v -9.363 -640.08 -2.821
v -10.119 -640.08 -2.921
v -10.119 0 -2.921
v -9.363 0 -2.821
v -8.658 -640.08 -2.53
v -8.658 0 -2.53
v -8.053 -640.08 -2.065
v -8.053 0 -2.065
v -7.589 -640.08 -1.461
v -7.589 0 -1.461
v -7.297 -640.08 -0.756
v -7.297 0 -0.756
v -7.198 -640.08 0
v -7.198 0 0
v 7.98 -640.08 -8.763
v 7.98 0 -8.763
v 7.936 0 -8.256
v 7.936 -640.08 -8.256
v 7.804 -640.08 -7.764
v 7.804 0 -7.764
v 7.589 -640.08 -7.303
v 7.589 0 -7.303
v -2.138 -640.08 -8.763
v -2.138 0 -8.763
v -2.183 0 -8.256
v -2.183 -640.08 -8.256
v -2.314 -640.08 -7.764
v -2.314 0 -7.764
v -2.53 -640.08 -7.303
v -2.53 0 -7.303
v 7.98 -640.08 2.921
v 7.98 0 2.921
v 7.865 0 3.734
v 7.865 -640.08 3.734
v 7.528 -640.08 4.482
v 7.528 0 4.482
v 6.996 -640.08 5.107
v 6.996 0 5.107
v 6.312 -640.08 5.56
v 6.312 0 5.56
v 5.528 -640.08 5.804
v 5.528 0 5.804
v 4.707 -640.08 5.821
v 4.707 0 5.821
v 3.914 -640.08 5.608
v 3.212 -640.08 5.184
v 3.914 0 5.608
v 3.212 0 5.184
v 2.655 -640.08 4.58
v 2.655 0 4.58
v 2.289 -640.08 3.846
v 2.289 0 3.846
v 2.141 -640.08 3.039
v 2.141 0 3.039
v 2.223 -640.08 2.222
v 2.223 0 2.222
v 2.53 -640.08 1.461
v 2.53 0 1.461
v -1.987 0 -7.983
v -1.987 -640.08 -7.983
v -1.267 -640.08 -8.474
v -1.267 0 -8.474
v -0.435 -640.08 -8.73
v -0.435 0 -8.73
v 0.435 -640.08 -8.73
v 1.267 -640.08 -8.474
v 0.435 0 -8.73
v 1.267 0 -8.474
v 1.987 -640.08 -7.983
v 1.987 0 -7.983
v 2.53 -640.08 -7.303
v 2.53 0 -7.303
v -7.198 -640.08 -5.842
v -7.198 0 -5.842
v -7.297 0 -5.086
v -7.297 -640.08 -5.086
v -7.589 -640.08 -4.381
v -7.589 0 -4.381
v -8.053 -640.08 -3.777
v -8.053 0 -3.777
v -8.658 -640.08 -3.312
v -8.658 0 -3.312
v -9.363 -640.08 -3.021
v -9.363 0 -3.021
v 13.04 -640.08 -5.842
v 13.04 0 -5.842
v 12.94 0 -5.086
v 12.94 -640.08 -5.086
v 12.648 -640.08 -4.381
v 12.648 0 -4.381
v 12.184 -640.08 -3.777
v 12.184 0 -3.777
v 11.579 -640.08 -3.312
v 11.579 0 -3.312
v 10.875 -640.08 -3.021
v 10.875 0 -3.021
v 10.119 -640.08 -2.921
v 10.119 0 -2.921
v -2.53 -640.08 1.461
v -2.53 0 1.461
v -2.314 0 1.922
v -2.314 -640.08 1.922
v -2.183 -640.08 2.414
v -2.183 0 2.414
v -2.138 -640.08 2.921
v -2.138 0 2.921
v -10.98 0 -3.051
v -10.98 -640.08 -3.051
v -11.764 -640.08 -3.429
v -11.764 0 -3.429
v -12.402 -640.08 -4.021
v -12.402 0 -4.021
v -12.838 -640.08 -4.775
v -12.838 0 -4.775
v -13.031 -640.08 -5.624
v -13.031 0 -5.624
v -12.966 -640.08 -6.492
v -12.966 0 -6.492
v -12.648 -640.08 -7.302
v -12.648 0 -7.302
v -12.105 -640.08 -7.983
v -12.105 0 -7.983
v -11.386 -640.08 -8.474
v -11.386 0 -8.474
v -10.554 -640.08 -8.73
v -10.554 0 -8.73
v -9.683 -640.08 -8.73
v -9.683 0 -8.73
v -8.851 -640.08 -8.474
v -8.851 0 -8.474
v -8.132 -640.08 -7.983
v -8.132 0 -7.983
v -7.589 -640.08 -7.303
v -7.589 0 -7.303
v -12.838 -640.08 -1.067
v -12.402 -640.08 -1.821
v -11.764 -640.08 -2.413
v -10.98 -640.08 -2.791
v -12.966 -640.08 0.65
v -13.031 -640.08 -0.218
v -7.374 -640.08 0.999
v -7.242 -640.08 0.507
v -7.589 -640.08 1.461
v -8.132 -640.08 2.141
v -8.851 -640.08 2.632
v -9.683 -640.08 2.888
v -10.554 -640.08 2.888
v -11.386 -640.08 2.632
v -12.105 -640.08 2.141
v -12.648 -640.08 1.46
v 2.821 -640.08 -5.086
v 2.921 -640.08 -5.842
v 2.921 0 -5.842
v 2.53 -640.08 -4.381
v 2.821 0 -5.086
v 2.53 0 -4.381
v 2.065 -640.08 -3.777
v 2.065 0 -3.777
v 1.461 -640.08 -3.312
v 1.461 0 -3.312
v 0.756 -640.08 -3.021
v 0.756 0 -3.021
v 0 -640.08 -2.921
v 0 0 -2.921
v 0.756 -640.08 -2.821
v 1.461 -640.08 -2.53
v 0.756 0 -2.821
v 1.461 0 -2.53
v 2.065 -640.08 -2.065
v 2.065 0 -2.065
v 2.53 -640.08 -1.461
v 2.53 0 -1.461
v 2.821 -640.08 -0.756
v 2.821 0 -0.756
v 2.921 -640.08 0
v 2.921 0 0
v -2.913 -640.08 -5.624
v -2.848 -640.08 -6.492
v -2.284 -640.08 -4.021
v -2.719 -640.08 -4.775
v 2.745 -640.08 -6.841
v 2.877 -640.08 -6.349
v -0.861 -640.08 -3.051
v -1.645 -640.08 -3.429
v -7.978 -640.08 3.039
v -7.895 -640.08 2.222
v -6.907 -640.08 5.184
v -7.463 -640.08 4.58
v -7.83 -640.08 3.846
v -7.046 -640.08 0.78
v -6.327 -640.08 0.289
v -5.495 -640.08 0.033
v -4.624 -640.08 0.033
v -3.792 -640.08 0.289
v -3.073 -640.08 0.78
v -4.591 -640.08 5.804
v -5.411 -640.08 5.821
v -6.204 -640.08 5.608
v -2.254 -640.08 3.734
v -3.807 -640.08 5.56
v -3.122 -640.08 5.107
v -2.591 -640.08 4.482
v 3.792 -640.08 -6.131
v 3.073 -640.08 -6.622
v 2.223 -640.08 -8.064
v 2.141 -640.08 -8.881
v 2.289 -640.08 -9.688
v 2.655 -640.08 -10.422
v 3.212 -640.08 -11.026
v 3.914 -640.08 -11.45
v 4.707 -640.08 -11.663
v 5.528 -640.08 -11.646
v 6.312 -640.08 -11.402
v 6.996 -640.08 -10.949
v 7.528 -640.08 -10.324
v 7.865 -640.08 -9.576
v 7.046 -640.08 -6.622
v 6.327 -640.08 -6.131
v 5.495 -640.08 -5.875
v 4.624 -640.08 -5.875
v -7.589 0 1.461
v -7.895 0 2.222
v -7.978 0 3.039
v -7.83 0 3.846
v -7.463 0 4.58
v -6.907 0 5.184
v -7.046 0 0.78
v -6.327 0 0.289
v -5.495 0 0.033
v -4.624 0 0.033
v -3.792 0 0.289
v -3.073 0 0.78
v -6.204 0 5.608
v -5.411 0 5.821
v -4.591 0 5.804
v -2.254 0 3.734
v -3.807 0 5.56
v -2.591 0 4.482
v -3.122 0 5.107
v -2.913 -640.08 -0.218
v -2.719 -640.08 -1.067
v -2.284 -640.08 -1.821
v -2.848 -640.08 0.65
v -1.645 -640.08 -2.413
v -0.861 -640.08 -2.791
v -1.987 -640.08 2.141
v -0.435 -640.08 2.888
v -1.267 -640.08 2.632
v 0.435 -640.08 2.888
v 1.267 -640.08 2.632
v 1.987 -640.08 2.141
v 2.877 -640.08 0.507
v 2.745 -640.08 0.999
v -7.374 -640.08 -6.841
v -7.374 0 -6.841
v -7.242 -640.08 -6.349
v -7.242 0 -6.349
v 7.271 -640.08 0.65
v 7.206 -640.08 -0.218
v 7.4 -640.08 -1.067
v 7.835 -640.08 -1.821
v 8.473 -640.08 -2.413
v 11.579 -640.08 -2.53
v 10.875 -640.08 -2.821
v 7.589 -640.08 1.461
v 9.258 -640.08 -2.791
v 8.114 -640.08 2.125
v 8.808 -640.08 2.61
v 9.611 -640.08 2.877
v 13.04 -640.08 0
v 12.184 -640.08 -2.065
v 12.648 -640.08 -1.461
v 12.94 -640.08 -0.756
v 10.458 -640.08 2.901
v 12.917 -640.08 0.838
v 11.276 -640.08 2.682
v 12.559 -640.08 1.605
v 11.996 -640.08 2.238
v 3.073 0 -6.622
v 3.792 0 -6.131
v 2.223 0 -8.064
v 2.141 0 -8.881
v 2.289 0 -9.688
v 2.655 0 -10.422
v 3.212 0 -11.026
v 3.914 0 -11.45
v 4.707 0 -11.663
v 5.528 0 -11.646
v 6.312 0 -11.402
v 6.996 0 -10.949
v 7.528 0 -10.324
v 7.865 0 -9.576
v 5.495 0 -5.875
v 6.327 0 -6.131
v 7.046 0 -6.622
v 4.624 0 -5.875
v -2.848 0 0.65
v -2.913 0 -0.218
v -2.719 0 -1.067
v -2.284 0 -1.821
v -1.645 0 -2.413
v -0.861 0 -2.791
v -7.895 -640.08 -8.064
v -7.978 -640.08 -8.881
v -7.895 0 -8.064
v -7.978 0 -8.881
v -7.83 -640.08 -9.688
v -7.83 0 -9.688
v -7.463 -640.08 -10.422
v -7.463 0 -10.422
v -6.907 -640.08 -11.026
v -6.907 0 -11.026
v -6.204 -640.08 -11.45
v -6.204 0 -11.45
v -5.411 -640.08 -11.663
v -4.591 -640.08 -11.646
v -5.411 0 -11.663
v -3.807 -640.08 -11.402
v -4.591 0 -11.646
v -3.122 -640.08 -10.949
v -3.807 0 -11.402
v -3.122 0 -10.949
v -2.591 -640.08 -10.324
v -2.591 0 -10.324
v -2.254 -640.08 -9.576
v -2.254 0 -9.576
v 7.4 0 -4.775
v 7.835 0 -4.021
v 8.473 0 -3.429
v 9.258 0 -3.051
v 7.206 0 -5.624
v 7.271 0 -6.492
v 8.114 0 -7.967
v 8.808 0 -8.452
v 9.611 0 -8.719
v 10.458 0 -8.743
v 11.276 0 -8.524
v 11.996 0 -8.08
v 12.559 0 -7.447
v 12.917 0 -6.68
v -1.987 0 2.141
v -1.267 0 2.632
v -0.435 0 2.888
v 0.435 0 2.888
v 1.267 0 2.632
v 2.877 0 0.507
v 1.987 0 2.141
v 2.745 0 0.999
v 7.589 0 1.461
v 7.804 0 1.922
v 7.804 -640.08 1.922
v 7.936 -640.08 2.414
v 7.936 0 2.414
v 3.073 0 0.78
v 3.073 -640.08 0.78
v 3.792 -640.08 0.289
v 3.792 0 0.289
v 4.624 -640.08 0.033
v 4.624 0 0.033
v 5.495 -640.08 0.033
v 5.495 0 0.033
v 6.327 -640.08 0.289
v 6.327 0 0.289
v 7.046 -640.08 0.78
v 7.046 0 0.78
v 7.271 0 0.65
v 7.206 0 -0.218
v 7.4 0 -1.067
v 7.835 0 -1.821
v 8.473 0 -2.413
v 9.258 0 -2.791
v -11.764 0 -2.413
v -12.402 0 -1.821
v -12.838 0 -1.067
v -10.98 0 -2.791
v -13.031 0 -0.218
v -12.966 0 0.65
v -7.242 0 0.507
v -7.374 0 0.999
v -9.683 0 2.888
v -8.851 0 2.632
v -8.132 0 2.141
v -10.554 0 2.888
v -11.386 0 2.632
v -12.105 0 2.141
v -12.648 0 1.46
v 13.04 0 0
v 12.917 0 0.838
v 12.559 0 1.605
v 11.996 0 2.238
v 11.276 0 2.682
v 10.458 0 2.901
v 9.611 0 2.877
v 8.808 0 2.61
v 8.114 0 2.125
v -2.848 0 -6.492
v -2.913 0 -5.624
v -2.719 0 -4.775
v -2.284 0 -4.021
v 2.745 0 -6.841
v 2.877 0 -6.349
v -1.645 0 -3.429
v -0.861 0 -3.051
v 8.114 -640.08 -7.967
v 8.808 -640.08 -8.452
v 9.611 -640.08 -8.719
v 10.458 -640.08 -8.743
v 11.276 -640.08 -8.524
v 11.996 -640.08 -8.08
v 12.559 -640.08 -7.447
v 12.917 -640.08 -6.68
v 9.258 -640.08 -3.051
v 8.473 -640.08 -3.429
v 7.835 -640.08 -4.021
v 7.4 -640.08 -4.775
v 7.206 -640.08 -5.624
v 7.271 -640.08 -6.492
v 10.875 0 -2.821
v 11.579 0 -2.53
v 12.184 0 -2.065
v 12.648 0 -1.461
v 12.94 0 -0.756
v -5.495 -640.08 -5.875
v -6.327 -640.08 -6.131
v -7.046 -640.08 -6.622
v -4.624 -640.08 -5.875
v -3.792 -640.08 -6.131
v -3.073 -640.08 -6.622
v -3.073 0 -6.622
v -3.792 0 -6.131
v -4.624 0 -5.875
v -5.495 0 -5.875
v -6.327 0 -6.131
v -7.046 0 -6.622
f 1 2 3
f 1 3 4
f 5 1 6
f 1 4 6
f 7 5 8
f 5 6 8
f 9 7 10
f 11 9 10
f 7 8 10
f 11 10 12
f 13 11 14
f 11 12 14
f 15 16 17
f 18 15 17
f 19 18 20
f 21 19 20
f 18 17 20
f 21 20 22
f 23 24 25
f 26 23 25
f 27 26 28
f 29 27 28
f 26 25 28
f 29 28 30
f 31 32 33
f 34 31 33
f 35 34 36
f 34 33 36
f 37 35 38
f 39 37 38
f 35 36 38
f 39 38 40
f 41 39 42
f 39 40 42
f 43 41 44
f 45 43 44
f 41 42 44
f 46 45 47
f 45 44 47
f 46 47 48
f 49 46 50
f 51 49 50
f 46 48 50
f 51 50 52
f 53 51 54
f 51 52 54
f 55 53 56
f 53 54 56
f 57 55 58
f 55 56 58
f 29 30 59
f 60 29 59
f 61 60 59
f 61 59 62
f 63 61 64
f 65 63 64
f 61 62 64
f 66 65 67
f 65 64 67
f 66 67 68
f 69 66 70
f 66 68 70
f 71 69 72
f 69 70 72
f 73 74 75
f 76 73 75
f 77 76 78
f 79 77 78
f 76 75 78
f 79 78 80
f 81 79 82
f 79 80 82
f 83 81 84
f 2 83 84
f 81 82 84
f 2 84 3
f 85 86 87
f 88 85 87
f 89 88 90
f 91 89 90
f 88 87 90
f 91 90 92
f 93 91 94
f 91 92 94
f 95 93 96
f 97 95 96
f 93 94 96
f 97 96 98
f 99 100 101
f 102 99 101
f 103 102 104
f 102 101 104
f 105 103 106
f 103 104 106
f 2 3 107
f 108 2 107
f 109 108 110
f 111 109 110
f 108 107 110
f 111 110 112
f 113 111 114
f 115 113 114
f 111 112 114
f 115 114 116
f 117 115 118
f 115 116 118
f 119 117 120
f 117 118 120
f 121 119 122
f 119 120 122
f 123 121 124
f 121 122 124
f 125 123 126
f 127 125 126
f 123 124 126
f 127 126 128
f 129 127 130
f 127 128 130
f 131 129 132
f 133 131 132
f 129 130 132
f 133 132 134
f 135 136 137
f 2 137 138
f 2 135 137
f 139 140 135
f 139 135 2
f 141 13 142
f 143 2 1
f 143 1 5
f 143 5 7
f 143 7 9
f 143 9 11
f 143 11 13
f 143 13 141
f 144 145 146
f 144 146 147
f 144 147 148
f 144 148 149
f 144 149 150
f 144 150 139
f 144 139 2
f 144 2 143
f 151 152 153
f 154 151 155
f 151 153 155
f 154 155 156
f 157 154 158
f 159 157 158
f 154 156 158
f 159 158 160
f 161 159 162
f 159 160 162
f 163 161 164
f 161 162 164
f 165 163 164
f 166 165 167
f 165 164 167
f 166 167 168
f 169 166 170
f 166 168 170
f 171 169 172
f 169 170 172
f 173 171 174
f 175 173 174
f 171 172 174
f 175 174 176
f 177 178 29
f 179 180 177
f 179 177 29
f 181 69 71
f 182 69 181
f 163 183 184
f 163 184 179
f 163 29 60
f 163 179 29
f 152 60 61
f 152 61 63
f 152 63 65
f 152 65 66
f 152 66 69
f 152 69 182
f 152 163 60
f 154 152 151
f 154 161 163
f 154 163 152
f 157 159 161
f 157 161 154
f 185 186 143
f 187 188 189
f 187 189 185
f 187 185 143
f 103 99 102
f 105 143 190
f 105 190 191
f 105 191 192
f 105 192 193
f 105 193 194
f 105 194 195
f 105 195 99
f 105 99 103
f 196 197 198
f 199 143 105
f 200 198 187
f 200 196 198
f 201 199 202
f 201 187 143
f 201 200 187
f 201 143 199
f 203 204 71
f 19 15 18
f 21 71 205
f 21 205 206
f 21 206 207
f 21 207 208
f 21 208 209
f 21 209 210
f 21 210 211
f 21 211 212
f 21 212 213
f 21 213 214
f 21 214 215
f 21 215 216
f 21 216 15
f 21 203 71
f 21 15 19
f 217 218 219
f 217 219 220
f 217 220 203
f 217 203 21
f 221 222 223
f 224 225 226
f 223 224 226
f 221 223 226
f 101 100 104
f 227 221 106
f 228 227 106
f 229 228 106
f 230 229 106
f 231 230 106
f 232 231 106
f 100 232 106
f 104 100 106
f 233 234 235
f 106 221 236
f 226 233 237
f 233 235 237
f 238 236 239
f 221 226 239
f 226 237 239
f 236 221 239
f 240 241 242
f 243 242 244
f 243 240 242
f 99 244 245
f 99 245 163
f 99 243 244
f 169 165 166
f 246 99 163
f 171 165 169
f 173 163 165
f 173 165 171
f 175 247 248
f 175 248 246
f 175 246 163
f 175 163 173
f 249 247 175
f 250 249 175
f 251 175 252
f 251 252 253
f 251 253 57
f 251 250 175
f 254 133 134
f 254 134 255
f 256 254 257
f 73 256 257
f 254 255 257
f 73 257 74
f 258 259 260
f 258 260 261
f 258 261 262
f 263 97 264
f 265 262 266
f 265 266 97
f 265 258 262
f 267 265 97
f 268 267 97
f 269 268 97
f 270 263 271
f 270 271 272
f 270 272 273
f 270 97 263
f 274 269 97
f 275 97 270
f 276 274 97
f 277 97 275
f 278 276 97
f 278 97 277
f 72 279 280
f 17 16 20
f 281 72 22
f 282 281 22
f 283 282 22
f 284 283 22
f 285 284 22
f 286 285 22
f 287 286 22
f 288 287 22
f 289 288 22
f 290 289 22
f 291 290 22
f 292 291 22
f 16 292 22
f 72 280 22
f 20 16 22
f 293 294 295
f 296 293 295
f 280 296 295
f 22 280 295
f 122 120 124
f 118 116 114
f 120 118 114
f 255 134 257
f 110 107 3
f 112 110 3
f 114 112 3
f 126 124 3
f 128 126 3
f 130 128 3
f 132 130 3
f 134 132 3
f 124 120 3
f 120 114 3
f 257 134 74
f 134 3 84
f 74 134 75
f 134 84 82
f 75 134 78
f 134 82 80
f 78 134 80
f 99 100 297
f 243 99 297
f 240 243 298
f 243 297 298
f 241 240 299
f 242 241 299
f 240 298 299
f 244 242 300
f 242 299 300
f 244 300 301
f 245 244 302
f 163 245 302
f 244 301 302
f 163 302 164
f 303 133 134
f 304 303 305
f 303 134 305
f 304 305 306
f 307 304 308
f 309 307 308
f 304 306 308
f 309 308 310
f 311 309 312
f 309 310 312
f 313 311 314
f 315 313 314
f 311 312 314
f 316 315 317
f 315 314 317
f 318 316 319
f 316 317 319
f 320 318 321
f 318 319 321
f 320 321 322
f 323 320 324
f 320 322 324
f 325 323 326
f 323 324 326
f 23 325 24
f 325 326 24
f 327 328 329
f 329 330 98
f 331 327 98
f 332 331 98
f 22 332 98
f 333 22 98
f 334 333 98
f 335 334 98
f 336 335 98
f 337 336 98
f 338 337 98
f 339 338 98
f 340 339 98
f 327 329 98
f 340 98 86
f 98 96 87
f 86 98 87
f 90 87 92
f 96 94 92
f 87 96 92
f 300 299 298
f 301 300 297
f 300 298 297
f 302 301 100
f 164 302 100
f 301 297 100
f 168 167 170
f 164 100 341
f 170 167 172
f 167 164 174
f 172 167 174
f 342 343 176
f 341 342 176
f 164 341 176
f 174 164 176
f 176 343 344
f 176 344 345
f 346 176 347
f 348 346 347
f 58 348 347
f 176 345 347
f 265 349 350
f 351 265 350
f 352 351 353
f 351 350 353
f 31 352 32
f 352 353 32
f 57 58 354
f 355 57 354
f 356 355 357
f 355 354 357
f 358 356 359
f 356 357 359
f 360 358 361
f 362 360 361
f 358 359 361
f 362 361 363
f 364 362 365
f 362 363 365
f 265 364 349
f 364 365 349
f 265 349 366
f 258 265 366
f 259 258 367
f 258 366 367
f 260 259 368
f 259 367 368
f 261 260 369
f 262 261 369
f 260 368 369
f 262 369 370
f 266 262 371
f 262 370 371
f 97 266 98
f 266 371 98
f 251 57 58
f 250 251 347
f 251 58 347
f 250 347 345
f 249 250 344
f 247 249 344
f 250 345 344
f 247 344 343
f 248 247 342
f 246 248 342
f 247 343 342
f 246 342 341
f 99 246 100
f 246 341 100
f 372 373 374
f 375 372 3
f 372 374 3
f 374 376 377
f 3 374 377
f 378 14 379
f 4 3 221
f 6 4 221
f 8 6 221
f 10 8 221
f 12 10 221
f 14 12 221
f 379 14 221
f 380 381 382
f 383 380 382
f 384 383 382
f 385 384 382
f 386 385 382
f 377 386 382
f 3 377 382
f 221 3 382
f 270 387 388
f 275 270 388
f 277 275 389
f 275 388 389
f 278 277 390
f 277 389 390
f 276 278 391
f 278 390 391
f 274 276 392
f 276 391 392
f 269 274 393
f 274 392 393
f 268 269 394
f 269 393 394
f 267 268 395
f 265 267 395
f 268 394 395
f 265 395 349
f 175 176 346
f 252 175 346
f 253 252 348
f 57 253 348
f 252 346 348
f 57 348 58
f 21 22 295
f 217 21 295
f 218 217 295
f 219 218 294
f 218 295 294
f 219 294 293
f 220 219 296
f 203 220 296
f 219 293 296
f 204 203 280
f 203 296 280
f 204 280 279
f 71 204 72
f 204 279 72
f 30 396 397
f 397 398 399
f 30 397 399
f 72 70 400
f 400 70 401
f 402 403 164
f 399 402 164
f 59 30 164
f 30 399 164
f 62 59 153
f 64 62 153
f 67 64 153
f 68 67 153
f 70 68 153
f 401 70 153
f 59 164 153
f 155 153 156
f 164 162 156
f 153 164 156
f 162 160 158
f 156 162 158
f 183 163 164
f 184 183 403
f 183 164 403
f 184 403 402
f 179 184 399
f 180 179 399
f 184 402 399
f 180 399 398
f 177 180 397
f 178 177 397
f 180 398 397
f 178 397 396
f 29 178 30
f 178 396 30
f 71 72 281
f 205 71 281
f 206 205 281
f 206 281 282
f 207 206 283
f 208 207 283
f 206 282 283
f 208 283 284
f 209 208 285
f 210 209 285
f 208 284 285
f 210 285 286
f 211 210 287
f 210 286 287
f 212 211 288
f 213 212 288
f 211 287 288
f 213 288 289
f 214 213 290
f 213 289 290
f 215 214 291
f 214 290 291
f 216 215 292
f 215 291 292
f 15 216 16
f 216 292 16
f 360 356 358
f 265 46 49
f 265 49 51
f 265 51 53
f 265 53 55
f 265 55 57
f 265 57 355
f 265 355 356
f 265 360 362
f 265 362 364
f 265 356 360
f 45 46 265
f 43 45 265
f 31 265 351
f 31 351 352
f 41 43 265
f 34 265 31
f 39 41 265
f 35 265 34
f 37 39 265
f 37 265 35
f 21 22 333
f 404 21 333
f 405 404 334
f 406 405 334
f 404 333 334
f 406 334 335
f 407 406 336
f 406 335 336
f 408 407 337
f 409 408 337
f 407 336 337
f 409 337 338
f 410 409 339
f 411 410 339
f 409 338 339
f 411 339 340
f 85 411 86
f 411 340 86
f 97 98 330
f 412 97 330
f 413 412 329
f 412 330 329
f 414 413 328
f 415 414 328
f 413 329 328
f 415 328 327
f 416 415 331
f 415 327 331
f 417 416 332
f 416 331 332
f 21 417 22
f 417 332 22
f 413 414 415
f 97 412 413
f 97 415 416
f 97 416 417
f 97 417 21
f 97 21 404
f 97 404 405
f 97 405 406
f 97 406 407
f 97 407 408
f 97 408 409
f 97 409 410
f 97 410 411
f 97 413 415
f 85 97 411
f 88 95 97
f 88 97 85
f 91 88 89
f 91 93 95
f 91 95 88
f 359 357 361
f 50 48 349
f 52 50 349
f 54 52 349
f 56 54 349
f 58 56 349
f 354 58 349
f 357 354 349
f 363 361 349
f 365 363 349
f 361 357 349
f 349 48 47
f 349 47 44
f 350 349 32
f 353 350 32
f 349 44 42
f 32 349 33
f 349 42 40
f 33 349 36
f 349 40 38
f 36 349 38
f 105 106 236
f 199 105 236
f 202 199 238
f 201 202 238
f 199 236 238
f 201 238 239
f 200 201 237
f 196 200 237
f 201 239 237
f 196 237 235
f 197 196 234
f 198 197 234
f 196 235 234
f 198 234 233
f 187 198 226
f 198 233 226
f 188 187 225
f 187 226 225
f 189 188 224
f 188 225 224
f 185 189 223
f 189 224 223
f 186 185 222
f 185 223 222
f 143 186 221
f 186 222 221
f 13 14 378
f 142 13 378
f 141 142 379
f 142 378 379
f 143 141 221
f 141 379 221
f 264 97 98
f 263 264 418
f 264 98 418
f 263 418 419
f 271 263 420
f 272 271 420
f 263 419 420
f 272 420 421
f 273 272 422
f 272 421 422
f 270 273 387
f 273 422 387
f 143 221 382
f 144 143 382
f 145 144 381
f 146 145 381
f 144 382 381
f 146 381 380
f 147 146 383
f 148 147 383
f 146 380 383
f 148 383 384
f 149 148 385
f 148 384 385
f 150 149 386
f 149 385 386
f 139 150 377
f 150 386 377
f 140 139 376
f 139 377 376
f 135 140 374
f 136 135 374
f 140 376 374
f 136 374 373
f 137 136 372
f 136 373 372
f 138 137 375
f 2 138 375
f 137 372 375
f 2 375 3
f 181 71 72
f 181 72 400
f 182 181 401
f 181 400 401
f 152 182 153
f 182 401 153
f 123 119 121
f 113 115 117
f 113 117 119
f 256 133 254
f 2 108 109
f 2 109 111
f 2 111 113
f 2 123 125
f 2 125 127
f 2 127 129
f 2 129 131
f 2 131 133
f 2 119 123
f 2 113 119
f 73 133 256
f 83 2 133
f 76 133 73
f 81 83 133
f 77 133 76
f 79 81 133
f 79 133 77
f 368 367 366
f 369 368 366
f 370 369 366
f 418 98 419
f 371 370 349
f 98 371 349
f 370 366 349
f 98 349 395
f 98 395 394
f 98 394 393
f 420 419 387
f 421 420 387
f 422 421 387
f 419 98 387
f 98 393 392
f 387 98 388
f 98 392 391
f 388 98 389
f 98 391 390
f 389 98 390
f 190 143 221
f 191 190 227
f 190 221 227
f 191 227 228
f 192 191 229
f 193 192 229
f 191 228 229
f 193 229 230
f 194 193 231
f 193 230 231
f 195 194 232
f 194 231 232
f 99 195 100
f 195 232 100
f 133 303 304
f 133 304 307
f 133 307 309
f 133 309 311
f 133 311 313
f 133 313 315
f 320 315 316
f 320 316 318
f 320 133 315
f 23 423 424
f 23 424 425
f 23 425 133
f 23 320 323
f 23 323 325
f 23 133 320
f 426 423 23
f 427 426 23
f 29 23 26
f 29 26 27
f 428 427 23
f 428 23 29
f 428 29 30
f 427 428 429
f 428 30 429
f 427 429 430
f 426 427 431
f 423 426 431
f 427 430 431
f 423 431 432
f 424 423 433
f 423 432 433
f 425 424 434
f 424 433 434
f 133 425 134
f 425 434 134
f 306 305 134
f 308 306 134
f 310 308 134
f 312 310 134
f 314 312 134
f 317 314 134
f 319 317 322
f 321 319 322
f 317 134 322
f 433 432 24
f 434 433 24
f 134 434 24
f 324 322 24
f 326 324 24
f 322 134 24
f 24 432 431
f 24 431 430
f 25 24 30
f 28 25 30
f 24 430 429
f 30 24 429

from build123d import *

# Parameters (mm, degrees)
F1_DEPTH = 640.08


with BuildPart() as f1:
    # F0 (on Front) → F1 (new body)
    with BuildSketch(Plane.XZ):
        with BuildLine():
            ThreePointArc((7.588948, -7.302519), (5.059299, -5.842037), (2.52965, -7.302519))
            ThreePointArc((2.52965, -7.302519), (4.303278, -11.584504), (7.980299, -8.763037))
            ThreePointArc((7.980299, -8.763037), (7.880766, -8.007016), (7.588948, -7.302519))
        make_face()
        with BuildLine():
            ThreePointArc((0, -2.921), (2.065459, -2.065459), (2.921, 0))
            ThreePointArc((2.921, 0), (2.821467, 0.756021), (2.52965, 1.460519))
            ThreePointArc((2.52965, 1.460519), (0, 2.921), (-2.529649, 1.460519))
            ThreePointArc((-2.529649, 1.460519), (-2.529666, -1.460491), (0, -2.921))
        make_face()
        with BuildLine():
            ThreePointArc((13.039598, -5.842), (12.184057, -3.776541), (10.118598, -2.921))
            ThreePointArc((10.118598, -2.921), (7.588932, -4.381509), (7.588948, -7.302519))
            ThreePointArc((7.588948, -7.302519), (10.874619, -8.663467), (13.039598, -5.842))
        make_face()
        with BuildLine():
            ThreePointArc((-2.138299, -8.763037), (-2.237832, -8.007016), (-2.529649, -7.302519))
            ThreePointArc((-2.529649, -7.302519), (-5.059299, -5.842037), (-7.588949, -7.302519))
            ThreePointArc((-7.588949, -7.302519), (-5.81532, -11.584504), (-2.138299, -8.763037))
        make_face()
        with BuildLine():
            ThreePointArc((13.039598, 0), (10.874619, 2.821467), (7.588948, 1.460519))
            ThreePointArc((7.588948, 1.460519), (7.588932, -1.460491), (10.118598, -2.921))
            ThreePointArc((10.118598, -2.921), (12.184057, -2.065459), (13.039598, 0))
        make_face()
        with BuildLine():
            ThreePointArc((7.980299, 2.921037), (4.303278, 5.742504), (2.52965, 1.460519))
            ThreePointArc((2.52965, 1.460519), (5.059299, 3.7e-05), (7.588948, 1.460519))
            ThreePointArc((7.588948, 1.460519), (7.880766, 2.165016), (7.980299, 2.921037))
        make_face()
        with BuildLine():
            ThreePointArc((-7.588949, 1.460519), (-5.059299, 3.7e-05), (-2.529649, 1.460519))
            ThreePointArc((-2.529649, 1.460519), (-2.237832, 2.165016), (-2.138299, 2.921037))
            ThreePointArc((-2.138299, 2.921037), (-5.81532, 5.742504), (-7.588949, 1.460519))
        make_face()
        with BuildLine():
            ThreePointArc((-7.197598, 0), (-7.297131, 0.756021), (-7.588949, 1.460519))
            ThreePointArc((-7.588949, 1.460519), (-12.648264, 1.460491), (-10.118598, -2.921))
            ThreePointArc((-10.118598, -2.921), (-8.053139, -2.065459), (-7.197598, 0))
        make_face()
        with BuildLine():
            ThreePointArc((-10.118598, -2.921), (-12.648264, -7.302491), (-7.588949, -7.302519))
            ThreePointArc((-7.588949, -7.302519), (-7.297131, -6.598021), (-7.197598, -5.842))
            ThreePointArc((-7.197598, -5.842), (-8.053139, -3.776541), (-10.118598, -2.921))
        make_face()
        with BuildLine():
            ThreePointArc((2.921, -5.842), (2.065459, -3.776541), (0, -2.921))
            ThreePointArc((0, -2.921), (-2.529666, -4.381509), (-2.529649, -7.302519))
            ThreePointArc((-2.529649, -7.302519), (0, -8.763), (2.52965, -7.302519))
            ThreePointArc((2.52965, -7.302519), (2.821467, -6.598021), (2.921, -5.842))
        make_face()
    extrude(amount=F1_DEPTH)


solid = f1.part
